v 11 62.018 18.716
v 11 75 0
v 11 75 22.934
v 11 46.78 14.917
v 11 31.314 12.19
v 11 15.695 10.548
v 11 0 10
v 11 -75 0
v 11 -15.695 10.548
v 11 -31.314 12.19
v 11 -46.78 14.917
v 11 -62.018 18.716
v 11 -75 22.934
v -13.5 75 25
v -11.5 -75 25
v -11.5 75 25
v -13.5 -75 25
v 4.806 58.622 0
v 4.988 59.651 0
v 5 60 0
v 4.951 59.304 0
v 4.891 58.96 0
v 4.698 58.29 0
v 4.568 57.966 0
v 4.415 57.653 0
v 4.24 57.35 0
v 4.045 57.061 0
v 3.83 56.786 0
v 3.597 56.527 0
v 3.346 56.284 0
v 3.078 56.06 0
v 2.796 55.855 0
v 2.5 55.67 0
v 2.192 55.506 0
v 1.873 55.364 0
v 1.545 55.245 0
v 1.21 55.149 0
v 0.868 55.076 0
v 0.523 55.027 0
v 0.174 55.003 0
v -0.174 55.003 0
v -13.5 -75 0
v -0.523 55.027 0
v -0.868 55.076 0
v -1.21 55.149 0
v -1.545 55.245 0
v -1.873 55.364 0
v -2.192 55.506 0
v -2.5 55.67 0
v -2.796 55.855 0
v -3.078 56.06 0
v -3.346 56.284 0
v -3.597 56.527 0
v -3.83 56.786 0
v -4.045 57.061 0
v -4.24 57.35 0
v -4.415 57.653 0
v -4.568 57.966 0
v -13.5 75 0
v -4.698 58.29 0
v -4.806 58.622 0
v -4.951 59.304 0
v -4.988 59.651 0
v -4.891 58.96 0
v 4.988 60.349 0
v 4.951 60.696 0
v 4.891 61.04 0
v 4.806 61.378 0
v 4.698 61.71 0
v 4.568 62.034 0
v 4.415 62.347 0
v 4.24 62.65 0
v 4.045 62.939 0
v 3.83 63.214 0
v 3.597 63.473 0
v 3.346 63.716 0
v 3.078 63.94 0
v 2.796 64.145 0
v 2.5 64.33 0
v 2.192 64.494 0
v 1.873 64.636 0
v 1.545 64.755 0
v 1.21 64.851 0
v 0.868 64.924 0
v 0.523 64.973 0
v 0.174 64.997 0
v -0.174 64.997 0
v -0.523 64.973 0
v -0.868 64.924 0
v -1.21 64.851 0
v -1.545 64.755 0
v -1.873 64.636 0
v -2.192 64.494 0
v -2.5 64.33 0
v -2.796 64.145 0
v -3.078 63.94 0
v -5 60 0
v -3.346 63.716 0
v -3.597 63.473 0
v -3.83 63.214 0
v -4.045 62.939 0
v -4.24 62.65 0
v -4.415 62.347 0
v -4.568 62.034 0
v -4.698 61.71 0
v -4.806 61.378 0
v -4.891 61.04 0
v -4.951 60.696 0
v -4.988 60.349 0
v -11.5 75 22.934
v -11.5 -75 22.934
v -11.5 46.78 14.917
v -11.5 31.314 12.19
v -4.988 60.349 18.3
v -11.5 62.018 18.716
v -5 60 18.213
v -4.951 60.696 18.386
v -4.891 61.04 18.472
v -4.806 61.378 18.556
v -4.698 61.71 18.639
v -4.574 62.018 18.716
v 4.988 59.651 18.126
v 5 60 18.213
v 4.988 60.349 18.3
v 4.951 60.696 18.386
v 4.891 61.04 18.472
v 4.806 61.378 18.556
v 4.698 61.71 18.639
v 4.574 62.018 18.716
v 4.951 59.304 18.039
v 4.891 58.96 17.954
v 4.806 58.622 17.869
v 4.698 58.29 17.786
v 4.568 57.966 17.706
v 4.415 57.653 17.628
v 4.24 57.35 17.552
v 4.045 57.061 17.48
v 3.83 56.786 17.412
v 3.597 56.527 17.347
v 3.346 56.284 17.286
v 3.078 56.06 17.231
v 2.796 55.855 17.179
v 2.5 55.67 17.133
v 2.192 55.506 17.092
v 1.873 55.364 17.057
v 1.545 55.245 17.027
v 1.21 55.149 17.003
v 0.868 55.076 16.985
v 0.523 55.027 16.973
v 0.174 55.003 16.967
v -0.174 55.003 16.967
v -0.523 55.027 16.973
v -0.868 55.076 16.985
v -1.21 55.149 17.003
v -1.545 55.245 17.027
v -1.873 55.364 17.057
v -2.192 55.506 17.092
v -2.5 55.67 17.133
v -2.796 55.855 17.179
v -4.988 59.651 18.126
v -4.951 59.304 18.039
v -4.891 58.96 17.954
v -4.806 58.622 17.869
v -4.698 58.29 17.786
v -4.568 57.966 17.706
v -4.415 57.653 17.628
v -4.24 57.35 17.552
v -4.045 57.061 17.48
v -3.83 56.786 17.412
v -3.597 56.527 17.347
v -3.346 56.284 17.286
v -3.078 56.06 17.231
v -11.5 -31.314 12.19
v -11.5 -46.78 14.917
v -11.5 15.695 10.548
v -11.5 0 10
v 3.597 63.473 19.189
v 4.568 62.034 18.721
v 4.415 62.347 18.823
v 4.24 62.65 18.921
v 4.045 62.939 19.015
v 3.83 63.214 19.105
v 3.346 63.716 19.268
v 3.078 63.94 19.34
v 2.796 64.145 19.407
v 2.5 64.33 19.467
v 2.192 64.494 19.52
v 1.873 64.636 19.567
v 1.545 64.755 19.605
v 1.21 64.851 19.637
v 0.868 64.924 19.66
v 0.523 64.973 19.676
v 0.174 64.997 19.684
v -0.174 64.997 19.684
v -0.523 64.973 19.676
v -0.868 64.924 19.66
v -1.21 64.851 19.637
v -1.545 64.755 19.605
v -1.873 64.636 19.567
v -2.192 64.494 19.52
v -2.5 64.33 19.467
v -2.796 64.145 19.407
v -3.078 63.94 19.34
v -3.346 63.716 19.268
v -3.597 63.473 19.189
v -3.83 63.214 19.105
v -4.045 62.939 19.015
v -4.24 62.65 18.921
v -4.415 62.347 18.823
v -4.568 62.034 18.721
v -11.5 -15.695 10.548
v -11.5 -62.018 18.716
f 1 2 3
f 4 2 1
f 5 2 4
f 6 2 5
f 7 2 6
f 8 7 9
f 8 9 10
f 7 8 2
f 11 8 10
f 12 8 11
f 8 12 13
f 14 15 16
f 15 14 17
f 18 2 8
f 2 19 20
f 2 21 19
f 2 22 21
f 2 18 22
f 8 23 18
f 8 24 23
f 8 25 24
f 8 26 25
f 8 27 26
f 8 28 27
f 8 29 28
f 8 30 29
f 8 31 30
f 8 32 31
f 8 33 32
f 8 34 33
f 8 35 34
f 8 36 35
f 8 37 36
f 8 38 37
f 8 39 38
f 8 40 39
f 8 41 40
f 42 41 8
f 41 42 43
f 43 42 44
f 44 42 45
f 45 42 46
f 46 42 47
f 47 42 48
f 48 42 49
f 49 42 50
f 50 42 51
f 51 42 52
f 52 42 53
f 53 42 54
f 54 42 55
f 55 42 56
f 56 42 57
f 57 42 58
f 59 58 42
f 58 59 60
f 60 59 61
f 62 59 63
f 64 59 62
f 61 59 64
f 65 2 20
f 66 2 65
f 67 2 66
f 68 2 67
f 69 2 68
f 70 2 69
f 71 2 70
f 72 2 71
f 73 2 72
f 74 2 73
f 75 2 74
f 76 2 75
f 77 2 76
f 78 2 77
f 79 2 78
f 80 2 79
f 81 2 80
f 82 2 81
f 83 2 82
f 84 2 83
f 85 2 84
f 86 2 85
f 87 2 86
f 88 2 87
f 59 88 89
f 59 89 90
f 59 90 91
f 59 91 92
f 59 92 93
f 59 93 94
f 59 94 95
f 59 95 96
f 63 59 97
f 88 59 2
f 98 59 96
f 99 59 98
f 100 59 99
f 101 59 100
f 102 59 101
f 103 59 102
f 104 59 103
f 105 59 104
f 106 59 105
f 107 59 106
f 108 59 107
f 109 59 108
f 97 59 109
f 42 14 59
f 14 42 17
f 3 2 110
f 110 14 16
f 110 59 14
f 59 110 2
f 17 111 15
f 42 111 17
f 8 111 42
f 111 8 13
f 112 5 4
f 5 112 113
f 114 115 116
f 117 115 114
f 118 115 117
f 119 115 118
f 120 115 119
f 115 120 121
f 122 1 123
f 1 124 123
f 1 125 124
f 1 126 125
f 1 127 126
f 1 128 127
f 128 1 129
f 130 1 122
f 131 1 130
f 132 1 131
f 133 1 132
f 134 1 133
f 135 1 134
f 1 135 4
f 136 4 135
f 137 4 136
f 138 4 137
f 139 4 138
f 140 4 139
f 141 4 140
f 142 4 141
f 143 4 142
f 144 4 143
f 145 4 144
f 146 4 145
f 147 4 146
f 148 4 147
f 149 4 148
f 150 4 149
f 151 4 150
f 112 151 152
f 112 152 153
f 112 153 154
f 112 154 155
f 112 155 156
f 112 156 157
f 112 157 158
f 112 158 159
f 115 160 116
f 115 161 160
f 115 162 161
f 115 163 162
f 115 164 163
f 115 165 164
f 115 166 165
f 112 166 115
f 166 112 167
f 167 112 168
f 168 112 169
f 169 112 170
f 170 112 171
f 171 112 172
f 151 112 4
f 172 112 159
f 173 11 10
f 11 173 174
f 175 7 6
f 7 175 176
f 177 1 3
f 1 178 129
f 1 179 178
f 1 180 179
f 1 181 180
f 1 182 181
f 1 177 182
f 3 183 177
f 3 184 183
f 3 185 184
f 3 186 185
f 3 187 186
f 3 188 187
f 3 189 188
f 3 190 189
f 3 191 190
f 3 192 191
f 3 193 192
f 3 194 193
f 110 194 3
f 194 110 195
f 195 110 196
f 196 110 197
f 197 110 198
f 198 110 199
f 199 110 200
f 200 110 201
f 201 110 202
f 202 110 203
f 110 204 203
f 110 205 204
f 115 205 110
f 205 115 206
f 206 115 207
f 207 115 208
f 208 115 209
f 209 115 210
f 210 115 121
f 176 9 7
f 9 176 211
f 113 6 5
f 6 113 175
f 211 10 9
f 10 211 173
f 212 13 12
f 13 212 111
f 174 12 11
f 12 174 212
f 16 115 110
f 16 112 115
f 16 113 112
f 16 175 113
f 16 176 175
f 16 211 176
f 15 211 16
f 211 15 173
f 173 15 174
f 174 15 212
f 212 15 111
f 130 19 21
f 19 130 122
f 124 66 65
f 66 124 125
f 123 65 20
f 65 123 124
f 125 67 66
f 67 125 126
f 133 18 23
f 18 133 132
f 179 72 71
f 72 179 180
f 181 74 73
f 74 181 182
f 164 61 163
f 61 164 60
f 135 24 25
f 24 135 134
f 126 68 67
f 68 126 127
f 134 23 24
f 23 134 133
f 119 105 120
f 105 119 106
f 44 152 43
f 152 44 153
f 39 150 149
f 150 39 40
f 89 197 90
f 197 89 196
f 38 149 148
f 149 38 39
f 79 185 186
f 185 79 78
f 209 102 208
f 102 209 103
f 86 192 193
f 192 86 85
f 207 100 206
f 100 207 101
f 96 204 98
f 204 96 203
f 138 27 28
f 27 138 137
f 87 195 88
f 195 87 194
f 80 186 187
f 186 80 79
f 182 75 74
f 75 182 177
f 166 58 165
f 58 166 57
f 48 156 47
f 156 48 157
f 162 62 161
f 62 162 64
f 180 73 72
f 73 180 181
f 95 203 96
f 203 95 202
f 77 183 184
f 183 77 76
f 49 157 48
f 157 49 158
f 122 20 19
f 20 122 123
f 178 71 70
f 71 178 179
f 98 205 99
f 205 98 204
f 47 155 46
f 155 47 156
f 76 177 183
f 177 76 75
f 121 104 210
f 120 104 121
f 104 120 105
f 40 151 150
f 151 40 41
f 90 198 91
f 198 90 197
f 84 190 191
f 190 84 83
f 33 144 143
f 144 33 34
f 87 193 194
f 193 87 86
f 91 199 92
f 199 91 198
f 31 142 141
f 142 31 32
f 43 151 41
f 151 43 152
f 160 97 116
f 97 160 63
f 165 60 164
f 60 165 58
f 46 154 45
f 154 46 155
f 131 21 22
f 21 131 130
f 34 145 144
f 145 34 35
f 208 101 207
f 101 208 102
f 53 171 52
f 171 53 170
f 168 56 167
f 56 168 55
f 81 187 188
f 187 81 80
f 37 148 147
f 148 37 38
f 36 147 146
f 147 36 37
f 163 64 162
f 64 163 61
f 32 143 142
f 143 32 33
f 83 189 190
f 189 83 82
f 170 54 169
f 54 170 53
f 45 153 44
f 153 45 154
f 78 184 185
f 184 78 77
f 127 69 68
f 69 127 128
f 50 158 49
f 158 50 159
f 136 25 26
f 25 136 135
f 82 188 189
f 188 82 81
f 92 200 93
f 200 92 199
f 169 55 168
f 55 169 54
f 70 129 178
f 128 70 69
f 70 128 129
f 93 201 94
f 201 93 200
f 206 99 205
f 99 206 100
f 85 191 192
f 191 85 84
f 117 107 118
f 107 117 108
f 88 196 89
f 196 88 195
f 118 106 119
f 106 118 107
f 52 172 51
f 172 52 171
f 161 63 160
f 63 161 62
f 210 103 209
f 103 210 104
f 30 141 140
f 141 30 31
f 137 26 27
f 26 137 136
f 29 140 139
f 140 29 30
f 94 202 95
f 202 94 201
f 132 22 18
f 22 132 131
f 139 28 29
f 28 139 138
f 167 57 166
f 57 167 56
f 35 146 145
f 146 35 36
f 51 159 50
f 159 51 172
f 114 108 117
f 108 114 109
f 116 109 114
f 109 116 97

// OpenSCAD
$fn = 90;

h = 10;   // lifter min height
l = 150;  // lifter length
w = 23;   // lifter width
d = 450;  // disc diameter

difference() {
  translate([-w/2 - 2, -l/2, 0])
    cube([w + 1.5, l, 2.5 * h]);
  translate([-w/2, 0, d/2 + h])
    rotate([0,90,0])
      cylinder(w, d=d);
  translate([0,l * .4,0])
    cylinder(20, d=10);
}
